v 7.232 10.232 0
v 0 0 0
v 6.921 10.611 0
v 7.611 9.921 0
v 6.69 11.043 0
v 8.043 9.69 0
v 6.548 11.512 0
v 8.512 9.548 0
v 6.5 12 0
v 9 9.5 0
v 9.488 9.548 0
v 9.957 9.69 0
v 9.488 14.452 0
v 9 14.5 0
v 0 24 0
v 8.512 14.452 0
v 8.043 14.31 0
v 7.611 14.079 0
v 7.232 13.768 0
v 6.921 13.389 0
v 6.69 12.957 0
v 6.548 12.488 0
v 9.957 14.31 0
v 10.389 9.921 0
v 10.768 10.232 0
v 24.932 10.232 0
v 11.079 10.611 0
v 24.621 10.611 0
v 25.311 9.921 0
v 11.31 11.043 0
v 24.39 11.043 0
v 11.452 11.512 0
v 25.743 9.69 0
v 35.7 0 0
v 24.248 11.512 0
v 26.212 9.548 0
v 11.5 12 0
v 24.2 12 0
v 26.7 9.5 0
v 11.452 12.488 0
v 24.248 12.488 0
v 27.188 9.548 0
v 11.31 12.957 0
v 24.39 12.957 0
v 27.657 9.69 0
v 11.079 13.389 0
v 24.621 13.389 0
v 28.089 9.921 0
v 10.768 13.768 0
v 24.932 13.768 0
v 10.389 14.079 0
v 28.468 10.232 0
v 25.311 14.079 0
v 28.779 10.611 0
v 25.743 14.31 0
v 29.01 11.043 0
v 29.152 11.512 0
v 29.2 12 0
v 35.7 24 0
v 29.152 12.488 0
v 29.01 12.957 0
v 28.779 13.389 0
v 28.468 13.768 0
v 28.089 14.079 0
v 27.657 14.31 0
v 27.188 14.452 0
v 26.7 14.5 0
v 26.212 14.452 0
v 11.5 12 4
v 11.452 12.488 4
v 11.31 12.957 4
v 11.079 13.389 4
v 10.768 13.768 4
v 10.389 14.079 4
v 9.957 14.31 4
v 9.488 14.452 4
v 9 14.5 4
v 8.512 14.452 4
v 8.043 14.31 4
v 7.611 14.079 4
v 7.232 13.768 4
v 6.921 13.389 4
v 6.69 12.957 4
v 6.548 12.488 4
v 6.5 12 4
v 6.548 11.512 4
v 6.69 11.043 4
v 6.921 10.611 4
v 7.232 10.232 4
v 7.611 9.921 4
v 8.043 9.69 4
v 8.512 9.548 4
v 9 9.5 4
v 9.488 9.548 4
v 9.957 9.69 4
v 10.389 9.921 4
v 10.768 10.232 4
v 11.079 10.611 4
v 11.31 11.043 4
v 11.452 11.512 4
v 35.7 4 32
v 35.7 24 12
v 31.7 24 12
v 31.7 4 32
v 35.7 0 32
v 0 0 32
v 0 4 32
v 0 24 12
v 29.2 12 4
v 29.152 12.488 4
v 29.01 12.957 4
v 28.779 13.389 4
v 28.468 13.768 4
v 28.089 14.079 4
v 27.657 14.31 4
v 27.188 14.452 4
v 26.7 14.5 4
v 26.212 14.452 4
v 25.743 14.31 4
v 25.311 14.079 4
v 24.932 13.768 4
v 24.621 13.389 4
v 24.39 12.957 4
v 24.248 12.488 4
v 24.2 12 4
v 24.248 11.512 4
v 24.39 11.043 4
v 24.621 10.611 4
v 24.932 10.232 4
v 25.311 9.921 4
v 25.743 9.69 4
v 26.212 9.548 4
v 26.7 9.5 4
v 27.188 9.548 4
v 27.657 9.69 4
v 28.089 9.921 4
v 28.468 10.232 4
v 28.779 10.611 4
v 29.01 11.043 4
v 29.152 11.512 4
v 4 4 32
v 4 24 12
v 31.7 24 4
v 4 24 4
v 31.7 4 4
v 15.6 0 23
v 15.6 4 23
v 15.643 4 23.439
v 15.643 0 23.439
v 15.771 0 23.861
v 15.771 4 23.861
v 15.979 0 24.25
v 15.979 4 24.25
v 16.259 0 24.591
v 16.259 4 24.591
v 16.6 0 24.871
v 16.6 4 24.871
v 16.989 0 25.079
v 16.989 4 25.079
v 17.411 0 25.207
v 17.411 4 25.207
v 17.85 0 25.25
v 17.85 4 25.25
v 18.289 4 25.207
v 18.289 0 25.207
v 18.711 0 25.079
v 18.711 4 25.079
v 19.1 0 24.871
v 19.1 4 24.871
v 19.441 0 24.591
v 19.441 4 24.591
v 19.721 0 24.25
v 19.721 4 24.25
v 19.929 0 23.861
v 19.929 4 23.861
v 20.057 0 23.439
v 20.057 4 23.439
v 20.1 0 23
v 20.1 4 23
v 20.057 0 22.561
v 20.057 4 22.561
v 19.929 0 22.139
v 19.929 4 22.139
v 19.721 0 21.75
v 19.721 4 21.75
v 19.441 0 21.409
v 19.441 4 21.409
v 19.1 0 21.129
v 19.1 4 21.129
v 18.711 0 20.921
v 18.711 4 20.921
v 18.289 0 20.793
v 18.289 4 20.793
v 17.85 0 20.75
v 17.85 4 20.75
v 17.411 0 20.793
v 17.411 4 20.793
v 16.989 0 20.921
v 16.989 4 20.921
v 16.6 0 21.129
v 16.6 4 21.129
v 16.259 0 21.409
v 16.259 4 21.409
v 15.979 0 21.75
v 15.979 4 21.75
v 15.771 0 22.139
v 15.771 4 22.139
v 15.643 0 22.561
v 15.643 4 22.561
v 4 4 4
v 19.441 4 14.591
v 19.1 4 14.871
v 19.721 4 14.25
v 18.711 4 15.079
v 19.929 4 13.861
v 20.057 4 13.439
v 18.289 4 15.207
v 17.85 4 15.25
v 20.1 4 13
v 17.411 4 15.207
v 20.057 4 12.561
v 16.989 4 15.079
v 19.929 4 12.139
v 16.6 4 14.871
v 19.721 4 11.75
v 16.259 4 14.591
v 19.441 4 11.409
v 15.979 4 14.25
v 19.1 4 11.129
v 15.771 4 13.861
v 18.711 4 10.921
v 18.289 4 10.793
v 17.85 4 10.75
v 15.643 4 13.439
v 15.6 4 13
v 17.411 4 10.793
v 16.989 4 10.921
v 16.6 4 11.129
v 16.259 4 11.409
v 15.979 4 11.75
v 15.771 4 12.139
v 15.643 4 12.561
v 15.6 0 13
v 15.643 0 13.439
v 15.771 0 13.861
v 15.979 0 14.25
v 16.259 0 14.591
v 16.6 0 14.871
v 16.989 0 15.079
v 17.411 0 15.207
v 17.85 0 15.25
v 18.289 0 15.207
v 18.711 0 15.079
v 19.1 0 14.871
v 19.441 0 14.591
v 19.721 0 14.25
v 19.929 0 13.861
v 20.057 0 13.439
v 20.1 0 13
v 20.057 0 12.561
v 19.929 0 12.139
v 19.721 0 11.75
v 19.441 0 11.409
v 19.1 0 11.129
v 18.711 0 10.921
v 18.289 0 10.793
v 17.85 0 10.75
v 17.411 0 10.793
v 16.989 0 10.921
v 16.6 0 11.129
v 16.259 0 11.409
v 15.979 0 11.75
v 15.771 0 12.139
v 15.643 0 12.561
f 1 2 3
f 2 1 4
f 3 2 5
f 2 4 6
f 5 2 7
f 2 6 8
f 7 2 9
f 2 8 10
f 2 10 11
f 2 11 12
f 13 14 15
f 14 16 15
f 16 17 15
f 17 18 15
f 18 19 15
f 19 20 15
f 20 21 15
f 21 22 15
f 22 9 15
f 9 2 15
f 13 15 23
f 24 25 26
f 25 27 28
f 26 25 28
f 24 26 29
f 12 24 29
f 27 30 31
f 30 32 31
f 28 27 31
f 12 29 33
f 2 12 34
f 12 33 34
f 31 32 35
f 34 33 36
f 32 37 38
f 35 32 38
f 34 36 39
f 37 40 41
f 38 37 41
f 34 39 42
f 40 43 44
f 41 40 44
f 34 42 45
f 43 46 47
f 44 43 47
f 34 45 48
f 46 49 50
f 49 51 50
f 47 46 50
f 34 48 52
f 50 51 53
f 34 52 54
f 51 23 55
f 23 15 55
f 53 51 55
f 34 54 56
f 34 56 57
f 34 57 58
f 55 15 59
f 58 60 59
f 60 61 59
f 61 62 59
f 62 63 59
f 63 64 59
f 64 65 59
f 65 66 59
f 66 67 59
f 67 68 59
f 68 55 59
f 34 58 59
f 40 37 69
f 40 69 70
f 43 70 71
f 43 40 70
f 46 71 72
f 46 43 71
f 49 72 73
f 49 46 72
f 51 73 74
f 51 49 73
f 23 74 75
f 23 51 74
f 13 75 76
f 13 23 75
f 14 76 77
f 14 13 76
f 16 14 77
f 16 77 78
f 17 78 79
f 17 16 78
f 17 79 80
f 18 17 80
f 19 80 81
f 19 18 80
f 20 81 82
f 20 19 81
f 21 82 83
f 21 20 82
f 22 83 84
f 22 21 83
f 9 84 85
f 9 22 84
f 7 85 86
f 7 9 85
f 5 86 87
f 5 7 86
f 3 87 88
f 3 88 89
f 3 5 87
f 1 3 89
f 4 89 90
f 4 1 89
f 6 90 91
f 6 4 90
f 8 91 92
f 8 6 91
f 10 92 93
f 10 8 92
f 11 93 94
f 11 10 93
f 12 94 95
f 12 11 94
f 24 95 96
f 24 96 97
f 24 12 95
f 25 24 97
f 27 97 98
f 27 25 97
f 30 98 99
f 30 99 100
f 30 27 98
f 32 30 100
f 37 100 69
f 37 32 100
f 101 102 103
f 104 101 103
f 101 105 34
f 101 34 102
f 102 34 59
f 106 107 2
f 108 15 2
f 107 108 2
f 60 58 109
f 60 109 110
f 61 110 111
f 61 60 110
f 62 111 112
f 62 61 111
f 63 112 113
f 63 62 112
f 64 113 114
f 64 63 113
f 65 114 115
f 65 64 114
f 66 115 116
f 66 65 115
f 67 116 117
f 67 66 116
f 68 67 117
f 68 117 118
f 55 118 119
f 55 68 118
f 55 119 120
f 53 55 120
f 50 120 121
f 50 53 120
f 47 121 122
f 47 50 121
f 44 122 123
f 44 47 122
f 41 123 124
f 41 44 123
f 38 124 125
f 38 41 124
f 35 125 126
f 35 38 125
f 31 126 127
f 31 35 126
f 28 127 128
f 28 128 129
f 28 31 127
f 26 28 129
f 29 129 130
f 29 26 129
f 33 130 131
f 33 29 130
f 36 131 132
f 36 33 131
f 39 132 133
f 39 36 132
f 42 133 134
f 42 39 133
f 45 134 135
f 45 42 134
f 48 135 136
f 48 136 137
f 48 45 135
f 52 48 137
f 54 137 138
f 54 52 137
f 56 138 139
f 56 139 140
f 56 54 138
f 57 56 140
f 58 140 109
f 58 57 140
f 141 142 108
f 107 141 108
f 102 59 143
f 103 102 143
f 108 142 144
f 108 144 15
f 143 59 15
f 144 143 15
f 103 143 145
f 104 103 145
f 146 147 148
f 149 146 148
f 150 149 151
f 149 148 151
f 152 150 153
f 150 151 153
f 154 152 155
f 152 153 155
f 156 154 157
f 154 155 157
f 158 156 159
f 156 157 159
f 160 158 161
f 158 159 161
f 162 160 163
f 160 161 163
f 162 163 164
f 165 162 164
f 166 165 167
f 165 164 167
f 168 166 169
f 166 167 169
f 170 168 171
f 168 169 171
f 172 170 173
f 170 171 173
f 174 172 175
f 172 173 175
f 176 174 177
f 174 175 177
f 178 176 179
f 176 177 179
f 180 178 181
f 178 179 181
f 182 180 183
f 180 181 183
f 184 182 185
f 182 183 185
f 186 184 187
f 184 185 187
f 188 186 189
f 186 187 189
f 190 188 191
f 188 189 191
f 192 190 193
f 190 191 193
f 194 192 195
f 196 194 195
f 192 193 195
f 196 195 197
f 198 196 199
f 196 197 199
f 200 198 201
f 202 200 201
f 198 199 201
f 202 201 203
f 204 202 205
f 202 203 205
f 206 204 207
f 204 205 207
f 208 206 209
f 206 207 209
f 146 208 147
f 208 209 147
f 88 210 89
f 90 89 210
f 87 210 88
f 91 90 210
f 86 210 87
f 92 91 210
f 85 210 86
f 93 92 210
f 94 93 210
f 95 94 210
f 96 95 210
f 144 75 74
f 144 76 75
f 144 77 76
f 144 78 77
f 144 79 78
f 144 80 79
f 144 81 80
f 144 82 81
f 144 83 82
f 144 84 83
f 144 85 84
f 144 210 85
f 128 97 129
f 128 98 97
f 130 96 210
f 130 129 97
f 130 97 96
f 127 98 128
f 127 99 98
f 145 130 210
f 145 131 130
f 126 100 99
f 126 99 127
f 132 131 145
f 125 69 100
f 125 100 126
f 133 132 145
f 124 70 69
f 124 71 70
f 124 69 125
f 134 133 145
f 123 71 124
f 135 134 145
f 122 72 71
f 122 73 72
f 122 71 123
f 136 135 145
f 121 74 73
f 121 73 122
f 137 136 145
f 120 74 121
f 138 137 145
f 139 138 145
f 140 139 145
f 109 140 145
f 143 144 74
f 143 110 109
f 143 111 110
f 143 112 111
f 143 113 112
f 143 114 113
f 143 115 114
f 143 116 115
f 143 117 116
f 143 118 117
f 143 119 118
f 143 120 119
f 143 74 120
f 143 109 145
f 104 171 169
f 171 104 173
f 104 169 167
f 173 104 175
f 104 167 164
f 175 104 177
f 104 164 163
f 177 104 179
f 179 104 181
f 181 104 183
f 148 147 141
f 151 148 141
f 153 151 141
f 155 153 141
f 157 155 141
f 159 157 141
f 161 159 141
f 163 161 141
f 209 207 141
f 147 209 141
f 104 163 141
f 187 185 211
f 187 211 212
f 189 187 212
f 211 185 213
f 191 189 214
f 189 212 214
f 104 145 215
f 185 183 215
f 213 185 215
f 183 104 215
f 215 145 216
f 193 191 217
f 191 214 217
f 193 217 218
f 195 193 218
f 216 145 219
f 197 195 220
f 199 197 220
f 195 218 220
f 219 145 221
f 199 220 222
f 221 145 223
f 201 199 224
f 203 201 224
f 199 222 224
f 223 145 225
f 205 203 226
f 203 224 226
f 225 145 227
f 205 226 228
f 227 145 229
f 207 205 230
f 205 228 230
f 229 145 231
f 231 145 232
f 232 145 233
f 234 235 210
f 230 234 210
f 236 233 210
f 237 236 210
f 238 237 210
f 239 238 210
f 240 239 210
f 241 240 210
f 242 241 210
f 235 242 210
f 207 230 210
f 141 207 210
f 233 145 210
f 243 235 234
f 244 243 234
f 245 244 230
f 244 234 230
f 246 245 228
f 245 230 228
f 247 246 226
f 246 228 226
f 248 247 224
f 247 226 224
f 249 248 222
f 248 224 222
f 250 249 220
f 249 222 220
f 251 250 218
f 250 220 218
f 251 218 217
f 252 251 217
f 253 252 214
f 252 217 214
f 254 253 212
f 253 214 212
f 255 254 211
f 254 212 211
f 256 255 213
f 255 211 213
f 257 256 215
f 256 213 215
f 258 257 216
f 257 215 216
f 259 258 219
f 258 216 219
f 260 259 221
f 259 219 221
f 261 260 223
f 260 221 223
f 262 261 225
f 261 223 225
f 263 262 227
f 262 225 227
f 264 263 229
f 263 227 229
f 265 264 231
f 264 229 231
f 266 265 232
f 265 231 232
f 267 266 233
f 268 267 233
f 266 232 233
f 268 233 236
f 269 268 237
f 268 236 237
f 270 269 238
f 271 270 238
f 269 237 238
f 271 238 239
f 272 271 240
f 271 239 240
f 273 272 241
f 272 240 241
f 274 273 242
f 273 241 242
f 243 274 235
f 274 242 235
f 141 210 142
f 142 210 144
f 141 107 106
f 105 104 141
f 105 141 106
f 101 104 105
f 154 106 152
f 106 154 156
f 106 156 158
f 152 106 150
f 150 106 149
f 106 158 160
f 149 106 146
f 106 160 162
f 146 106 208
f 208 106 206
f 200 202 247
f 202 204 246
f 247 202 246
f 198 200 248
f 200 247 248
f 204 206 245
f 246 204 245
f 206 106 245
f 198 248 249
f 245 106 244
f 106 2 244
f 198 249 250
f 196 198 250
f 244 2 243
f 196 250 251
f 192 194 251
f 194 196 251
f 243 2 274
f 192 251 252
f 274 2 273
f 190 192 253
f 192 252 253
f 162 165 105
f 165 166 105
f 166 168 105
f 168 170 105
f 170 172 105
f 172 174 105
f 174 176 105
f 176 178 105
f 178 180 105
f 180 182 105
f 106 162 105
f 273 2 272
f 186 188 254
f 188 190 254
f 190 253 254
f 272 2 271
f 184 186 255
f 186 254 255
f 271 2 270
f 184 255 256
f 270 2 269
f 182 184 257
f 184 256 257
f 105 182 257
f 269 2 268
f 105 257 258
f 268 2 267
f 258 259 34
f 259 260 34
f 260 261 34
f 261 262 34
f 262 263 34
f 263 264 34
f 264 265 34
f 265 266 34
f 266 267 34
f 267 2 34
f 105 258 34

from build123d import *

# Parameters (mm, degrees)
F0_W     = 35.7
F0_H     = 24
F0_R     = 2.5
F1_DEPTH = 4
F3_DEPTH = 28
F4_SIZE  = 20
F5_R     = 2.25
F6_DEPTH = 4


with BuildPart() as f1:
    # F0 (on Top) → F1 (new body)
    with BuildSketch(Plane.XY):
        with Locations((17.85, 12)):
            Rectangle(F0_W, F0_H)
        with Locations((9, 12)):
            Circle(F0_R, mode=Mode.SUBTRACT)
        with Locations((26.7, 12)):
            Circle(F0_R, mode=Mode.SUBTRACT)
    extrude(amount=F1_DEPTH)

    # F2 (on face) → F3 (join)
    with BuildSketch(Plane.XY.offset(4)):
        Polygon((31.7, 4), (4, 4), (4, 20), (4, 24), (0, 24), (0, 0), (35.7, 0), (35.7, 24), (31.7, 24), (31.7, 20), align=None)
    extrude(amount=F3_DEPTH)

    # F4
    f4_edges = [f1.edges().sort_by_distance(p)[0] for p in [
        (33.7, 24, 32),
        (2, 24, 32),
    ]]
    chamfer(f4_edges, length=F4_SIZE)

    # F5 (on face) → F6 (cut)
    with BuildSketch(Plane(origin=(0, 4, 0), x_dir=(-1, 0, 0), z_dir=(0, 1, 0))):
        with Locations((-17.85, 23)):
            Circle(F5_R)
        with Locations((-17.85, 13)):
            Circle(F5_R)
    extrude(amount=-F6_DEPTH, mode=Mode.SUBTRACT)


solid = f1.part
